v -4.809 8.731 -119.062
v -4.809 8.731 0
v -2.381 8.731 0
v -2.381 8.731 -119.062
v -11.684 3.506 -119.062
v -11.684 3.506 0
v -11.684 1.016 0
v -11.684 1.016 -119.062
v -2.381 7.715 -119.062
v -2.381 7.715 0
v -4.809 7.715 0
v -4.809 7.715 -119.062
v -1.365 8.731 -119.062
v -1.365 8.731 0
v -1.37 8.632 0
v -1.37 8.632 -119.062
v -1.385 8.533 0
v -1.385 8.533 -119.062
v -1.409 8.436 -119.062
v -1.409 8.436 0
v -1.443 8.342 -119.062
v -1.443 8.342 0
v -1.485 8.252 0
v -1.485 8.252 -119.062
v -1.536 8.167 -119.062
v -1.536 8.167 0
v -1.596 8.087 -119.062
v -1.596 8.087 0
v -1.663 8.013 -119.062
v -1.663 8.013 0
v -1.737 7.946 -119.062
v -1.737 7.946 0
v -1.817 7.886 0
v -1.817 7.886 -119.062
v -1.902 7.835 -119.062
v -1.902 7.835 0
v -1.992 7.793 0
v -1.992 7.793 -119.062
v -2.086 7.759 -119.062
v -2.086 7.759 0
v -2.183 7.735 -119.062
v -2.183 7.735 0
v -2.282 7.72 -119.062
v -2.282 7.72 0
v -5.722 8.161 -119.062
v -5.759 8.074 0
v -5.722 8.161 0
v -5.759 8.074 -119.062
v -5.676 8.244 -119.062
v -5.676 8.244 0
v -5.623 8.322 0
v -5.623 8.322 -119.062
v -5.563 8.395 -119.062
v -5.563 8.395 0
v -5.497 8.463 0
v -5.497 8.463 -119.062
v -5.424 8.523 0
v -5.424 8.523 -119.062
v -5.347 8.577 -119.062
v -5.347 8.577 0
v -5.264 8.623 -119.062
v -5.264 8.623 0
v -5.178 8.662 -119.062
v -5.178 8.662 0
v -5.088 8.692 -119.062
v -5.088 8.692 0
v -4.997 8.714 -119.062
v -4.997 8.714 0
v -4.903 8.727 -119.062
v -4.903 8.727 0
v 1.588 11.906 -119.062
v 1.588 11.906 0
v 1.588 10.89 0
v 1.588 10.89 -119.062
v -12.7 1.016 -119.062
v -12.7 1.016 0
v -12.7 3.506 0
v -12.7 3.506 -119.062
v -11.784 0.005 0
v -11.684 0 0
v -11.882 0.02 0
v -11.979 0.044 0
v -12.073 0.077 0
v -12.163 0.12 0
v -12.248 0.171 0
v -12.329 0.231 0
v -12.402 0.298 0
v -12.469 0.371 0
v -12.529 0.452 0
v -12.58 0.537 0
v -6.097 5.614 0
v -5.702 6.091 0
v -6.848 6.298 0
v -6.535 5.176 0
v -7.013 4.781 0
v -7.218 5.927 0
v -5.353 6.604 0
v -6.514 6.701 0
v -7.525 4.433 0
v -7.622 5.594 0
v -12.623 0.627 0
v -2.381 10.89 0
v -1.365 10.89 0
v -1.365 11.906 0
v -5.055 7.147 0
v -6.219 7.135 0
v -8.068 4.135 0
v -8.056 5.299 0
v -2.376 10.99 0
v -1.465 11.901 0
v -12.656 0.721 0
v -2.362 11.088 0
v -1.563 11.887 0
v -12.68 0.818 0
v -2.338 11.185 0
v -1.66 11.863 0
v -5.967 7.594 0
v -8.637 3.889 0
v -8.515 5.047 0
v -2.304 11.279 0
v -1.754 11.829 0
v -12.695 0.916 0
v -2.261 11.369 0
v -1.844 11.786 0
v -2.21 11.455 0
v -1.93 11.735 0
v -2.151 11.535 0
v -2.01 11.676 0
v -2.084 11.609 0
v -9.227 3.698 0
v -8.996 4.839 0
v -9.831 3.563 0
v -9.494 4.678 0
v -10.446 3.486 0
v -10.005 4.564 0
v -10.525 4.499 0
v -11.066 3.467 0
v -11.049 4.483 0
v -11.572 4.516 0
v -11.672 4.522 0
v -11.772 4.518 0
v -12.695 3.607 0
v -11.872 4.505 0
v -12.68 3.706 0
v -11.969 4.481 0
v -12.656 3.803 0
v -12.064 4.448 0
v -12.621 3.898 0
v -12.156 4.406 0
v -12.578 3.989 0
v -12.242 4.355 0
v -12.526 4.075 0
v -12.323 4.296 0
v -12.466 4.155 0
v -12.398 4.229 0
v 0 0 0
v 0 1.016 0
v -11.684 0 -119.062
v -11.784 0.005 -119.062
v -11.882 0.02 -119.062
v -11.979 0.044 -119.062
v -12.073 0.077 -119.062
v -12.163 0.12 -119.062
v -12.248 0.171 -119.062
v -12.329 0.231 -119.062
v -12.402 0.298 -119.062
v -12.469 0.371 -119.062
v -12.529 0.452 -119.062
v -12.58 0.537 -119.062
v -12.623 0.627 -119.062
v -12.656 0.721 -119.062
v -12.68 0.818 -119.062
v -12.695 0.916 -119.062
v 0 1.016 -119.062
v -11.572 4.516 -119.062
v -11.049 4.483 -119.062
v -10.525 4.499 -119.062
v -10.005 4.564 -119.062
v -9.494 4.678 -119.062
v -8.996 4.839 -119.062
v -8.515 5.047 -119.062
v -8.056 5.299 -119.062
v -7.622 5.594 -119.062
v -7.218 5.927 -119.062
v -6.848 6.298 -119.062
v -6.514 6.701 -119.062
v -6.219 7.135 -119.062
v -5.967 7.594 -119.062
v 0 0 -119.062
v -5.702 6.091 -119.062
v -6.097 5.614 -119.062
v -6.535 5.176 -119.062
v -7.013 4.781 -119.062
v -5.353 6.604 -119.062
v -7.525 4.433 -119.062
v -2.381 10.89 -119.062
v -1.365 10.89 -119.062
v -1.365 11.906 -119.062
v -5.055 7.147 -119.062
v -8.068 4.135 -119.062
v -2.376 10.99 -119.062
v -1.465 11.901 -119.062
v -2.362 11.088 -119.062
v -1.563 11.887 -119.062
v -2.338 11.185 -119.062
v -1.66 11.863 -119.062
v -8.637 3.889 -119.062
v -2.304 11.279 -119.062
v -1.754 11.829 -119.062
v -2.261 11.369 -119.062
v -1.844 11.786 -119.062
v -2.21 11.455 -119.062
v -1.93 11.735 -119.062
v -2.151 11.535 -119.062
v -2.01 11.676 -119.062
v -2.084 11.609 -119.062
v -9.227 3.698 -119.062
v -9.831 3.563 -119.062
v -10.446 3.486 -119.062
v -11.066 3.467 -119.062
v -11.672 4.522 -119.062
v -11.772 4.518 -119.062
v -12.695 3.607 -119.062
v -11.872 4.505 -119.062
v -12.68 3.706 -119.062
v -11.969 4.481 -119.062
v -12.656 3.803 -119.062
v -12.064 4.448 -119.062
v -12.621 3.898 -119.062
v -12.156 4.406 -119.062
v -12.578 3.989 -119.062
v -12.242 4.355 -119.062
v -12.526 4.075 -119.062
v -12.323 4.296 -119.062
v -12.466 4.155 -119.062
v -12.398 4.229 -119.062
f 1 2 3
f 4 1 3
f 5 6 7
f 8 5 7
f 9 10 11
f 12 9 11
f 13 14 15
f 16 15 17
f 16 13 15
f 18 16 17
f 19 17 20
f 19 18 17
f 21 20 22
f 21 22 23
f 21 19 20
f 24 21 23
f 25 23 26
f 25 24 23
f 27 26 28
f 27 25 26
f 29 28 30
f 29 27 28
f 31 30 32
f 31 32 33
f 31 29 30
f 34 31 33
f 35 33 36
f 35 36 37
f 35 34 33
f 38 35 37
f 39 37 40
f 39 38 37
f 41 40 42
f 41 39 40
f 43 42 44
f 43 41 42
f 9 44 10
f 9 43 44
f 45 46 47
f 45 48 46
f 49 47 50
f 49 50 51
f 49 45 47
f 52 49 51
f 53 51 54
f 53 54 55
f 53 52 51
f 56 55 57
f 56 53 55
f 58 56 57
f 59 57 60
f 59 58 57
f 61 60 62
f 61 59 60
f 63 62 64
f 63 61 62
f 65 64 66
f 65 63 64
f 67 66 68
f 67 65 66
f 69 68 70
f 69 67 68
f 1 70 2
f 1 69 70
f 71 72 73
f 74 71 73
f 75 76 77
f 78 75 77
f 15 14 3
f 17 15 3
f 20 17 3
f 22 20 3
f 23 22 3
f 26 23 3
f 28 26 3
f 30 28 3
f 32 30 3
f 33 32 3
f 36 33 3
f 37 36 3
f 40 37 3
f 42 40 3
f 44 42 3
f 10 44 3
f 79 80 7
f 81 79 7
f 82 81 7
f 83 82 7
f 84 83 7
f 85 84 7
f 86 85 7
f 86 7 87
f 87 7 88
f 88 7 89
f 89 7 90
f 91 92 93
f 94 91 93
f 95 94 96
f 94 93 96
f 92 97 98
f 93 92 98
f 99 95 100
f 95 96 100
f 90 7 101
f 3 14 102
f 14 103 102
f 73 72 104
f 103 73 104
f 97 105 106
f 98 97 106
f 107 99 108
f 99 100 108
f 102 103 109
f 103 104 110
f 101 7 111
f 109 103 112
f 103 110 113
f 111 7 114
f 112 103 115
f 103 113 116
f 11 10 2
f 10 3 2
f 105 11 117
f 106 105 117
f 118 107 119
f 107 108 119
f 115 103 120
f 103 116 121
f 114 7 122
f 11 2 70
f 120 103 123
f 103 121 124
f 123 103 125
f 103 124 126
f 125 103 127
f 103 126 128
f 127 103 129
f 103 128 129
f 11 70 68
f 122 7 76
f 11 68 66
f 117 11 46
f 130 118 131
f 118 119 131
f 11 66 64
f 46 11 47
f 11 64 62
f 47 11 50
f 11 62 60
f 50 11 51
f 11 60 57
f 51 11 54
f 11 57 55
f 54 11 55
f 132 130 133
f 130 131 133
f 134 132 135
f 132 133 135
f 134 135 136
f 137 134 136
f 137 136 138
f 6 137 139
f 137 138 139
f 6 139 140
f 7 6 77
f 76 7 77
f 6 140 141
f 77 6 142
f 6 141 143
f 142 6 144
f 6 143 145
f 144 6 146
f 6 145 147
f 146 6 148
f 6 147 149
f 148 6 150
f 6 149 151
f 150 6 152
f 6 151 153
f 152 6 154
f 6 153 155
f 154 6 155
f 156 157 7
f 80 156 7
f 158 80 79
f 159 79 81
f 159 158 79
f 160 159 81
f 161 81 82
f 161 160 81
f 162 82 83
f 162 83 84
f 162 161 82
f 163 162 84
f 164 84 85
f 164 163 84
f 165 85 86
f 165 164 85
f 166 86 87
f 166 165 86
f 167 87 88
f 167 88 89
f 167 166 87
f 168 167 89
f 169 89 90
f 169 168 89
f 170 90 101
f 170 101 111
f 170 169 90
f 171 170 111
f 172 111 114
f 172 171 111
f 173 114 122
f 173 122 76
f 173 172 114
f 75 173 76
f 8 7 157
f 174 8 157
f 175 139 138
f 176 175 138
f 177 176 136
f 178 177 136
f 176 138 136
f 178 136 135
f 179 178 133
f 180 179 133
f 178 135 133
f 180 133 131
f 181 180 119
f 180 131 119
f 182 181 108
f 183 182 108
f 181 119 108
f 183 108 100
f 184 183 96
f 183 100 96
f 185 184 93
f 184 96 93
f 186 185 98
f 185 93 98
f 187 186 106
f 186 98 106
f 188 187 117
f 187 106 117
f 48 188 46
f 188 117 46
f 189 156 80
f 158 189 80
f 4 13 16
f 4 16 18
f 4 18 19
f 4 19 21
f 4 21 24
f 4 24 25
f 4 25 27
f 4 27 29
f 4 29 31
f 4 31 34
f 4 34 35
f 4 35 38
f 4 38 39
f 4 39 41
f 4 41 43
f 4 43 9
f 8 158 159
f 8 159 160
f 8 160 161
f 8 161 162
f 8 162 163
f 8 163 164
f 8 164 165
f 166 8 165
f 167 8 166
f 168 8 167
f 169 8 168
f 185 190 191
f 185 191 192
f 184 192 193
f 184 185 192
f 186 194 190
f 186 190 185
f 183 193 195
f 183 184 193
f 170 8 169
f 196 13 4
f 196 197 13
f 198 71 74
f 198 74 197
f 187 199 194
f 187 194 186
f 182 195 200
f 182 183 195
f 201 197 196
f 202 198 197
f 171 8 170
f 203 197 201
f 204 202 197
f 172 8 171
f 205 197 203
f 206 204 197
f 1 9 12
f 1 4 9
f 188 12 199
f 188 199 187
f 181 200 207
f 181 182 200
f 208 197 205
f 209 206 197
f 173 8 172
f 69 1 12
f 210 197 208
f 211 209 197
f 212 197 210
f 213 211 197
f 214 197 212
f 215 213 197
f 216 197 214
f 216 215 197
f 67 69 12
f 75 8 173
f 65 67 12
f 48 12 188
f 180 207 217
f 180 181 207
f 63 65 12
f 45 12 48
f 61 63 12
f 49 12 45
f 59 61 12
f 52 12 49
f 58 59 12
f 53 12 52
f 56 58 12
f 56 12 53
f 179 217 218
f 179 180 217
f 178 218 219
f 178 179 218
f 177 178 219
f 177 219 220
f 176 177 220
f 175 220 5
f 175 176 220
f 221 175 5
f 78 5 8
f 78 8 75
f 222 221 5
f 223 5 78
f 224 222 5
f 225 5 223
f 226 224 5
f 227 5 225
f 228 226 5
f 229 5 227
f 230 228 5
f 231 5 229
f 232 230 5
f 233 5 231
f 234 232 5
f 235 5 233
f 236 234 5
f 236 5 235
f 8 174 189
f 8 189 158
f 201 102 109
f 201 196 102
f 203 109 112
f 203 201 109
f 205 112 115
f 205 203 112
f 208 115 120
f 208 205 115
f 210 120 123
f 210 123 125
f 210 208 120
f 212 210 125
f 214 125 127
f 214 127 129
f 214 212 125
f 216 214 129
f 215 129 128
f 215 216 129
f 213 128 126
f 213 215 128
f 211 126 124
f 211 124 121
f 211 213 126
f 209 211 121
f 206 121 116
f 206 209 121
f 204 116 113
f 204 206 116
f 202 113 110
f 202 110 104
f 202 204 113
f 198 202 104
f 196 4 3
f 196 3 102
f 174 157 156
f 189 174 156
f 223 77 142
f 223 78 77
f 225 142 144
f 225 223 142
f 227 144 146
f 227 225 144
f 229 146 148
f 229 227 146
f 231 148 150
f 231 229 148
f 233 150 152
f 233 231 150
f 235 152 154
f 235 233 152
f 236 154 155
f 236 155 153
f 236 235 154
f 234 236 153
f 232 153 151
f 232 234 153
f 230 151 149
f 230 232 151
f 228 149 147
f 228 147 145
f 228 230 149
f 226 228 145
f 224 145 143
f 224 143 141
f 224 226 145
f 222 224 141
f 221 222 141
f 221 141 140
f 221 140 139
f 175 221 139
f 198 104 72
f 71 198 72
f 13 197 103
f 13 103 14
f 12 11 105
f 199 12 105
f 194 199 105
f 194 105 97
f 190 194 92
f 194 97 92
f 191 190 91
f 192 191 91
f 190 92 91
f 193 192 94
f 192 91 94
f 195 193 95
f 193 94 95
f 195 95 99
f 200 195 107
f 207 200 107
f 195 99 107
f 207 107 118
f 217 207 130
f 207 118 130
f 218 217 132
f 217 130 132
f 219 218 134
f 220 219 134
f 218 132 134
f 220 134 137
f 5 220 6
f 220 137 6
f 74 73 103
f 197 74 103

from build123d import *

# Parameters (mm, degrees)
EXTRUDE_THIN1_DEPTH = 119.0625
FILLET1_R           = 1.016


with BuildPart() as part:
    # Sketch1 → Extrude-Thin1 (new body)
    with BuildSketch(Plane.XY):
        with BuildLine():
            Line((0, 0), (-12.7, 0))
            Line((-12.7, 0), (-12.7, 4.7625))
            ThreePointArc((-12.7, 4.7625), (-8.258259272, 5.18111669), (-5.55625, 8.73125))
            Line((-5.55625, 8.73125), (-2.38125, 8.73125))
            Line((-2.38125, 8.73125), (-2.38125, 11.90625))
            Line((-2.38125, 11.90625), (1.5875, 11.90625))
            Line((1.5875, 11.90625), (1.5875, 10.89025))
            Line((1.5875, 10.89025), (-1.36525, 10.89025))
            Line((-1.36525, 10.89025), (-1.36525, 7.71525))
            Line((-1.36525, 7.71525), (-4.8085569, 7.71525))
            ThreePointArc((-4.8085569, 7.71525), (-7.525174126, 4.432825355), (-11.684, 3.506279057))
            Line((-11.684, 3.506279057), (-11.684, 1.016))
            Line((-11.684, 1.016), (0, 1.016))
            Line((0, 1.016), (0, 0))
        make_face()
    extrude(amount=-EXTRUDE_THIN1_DEPTH)

    # Fillet1
    fillet1_edges = [part.edges().sort_by_distance(p)[0] for p in [
        (-1.36525, 7.71525, -59.53125),
        (-12.7, 0, -59.53125),
        (-12.7, 4.7625, -59.53125),
        (-5.55625, 8.73125, -59.53125),
        (-2.38125, 11.90625, -59.53125),
    ]]
    fillet(fillet1_edges, radius=FILLET1_R)


solid = part.part
